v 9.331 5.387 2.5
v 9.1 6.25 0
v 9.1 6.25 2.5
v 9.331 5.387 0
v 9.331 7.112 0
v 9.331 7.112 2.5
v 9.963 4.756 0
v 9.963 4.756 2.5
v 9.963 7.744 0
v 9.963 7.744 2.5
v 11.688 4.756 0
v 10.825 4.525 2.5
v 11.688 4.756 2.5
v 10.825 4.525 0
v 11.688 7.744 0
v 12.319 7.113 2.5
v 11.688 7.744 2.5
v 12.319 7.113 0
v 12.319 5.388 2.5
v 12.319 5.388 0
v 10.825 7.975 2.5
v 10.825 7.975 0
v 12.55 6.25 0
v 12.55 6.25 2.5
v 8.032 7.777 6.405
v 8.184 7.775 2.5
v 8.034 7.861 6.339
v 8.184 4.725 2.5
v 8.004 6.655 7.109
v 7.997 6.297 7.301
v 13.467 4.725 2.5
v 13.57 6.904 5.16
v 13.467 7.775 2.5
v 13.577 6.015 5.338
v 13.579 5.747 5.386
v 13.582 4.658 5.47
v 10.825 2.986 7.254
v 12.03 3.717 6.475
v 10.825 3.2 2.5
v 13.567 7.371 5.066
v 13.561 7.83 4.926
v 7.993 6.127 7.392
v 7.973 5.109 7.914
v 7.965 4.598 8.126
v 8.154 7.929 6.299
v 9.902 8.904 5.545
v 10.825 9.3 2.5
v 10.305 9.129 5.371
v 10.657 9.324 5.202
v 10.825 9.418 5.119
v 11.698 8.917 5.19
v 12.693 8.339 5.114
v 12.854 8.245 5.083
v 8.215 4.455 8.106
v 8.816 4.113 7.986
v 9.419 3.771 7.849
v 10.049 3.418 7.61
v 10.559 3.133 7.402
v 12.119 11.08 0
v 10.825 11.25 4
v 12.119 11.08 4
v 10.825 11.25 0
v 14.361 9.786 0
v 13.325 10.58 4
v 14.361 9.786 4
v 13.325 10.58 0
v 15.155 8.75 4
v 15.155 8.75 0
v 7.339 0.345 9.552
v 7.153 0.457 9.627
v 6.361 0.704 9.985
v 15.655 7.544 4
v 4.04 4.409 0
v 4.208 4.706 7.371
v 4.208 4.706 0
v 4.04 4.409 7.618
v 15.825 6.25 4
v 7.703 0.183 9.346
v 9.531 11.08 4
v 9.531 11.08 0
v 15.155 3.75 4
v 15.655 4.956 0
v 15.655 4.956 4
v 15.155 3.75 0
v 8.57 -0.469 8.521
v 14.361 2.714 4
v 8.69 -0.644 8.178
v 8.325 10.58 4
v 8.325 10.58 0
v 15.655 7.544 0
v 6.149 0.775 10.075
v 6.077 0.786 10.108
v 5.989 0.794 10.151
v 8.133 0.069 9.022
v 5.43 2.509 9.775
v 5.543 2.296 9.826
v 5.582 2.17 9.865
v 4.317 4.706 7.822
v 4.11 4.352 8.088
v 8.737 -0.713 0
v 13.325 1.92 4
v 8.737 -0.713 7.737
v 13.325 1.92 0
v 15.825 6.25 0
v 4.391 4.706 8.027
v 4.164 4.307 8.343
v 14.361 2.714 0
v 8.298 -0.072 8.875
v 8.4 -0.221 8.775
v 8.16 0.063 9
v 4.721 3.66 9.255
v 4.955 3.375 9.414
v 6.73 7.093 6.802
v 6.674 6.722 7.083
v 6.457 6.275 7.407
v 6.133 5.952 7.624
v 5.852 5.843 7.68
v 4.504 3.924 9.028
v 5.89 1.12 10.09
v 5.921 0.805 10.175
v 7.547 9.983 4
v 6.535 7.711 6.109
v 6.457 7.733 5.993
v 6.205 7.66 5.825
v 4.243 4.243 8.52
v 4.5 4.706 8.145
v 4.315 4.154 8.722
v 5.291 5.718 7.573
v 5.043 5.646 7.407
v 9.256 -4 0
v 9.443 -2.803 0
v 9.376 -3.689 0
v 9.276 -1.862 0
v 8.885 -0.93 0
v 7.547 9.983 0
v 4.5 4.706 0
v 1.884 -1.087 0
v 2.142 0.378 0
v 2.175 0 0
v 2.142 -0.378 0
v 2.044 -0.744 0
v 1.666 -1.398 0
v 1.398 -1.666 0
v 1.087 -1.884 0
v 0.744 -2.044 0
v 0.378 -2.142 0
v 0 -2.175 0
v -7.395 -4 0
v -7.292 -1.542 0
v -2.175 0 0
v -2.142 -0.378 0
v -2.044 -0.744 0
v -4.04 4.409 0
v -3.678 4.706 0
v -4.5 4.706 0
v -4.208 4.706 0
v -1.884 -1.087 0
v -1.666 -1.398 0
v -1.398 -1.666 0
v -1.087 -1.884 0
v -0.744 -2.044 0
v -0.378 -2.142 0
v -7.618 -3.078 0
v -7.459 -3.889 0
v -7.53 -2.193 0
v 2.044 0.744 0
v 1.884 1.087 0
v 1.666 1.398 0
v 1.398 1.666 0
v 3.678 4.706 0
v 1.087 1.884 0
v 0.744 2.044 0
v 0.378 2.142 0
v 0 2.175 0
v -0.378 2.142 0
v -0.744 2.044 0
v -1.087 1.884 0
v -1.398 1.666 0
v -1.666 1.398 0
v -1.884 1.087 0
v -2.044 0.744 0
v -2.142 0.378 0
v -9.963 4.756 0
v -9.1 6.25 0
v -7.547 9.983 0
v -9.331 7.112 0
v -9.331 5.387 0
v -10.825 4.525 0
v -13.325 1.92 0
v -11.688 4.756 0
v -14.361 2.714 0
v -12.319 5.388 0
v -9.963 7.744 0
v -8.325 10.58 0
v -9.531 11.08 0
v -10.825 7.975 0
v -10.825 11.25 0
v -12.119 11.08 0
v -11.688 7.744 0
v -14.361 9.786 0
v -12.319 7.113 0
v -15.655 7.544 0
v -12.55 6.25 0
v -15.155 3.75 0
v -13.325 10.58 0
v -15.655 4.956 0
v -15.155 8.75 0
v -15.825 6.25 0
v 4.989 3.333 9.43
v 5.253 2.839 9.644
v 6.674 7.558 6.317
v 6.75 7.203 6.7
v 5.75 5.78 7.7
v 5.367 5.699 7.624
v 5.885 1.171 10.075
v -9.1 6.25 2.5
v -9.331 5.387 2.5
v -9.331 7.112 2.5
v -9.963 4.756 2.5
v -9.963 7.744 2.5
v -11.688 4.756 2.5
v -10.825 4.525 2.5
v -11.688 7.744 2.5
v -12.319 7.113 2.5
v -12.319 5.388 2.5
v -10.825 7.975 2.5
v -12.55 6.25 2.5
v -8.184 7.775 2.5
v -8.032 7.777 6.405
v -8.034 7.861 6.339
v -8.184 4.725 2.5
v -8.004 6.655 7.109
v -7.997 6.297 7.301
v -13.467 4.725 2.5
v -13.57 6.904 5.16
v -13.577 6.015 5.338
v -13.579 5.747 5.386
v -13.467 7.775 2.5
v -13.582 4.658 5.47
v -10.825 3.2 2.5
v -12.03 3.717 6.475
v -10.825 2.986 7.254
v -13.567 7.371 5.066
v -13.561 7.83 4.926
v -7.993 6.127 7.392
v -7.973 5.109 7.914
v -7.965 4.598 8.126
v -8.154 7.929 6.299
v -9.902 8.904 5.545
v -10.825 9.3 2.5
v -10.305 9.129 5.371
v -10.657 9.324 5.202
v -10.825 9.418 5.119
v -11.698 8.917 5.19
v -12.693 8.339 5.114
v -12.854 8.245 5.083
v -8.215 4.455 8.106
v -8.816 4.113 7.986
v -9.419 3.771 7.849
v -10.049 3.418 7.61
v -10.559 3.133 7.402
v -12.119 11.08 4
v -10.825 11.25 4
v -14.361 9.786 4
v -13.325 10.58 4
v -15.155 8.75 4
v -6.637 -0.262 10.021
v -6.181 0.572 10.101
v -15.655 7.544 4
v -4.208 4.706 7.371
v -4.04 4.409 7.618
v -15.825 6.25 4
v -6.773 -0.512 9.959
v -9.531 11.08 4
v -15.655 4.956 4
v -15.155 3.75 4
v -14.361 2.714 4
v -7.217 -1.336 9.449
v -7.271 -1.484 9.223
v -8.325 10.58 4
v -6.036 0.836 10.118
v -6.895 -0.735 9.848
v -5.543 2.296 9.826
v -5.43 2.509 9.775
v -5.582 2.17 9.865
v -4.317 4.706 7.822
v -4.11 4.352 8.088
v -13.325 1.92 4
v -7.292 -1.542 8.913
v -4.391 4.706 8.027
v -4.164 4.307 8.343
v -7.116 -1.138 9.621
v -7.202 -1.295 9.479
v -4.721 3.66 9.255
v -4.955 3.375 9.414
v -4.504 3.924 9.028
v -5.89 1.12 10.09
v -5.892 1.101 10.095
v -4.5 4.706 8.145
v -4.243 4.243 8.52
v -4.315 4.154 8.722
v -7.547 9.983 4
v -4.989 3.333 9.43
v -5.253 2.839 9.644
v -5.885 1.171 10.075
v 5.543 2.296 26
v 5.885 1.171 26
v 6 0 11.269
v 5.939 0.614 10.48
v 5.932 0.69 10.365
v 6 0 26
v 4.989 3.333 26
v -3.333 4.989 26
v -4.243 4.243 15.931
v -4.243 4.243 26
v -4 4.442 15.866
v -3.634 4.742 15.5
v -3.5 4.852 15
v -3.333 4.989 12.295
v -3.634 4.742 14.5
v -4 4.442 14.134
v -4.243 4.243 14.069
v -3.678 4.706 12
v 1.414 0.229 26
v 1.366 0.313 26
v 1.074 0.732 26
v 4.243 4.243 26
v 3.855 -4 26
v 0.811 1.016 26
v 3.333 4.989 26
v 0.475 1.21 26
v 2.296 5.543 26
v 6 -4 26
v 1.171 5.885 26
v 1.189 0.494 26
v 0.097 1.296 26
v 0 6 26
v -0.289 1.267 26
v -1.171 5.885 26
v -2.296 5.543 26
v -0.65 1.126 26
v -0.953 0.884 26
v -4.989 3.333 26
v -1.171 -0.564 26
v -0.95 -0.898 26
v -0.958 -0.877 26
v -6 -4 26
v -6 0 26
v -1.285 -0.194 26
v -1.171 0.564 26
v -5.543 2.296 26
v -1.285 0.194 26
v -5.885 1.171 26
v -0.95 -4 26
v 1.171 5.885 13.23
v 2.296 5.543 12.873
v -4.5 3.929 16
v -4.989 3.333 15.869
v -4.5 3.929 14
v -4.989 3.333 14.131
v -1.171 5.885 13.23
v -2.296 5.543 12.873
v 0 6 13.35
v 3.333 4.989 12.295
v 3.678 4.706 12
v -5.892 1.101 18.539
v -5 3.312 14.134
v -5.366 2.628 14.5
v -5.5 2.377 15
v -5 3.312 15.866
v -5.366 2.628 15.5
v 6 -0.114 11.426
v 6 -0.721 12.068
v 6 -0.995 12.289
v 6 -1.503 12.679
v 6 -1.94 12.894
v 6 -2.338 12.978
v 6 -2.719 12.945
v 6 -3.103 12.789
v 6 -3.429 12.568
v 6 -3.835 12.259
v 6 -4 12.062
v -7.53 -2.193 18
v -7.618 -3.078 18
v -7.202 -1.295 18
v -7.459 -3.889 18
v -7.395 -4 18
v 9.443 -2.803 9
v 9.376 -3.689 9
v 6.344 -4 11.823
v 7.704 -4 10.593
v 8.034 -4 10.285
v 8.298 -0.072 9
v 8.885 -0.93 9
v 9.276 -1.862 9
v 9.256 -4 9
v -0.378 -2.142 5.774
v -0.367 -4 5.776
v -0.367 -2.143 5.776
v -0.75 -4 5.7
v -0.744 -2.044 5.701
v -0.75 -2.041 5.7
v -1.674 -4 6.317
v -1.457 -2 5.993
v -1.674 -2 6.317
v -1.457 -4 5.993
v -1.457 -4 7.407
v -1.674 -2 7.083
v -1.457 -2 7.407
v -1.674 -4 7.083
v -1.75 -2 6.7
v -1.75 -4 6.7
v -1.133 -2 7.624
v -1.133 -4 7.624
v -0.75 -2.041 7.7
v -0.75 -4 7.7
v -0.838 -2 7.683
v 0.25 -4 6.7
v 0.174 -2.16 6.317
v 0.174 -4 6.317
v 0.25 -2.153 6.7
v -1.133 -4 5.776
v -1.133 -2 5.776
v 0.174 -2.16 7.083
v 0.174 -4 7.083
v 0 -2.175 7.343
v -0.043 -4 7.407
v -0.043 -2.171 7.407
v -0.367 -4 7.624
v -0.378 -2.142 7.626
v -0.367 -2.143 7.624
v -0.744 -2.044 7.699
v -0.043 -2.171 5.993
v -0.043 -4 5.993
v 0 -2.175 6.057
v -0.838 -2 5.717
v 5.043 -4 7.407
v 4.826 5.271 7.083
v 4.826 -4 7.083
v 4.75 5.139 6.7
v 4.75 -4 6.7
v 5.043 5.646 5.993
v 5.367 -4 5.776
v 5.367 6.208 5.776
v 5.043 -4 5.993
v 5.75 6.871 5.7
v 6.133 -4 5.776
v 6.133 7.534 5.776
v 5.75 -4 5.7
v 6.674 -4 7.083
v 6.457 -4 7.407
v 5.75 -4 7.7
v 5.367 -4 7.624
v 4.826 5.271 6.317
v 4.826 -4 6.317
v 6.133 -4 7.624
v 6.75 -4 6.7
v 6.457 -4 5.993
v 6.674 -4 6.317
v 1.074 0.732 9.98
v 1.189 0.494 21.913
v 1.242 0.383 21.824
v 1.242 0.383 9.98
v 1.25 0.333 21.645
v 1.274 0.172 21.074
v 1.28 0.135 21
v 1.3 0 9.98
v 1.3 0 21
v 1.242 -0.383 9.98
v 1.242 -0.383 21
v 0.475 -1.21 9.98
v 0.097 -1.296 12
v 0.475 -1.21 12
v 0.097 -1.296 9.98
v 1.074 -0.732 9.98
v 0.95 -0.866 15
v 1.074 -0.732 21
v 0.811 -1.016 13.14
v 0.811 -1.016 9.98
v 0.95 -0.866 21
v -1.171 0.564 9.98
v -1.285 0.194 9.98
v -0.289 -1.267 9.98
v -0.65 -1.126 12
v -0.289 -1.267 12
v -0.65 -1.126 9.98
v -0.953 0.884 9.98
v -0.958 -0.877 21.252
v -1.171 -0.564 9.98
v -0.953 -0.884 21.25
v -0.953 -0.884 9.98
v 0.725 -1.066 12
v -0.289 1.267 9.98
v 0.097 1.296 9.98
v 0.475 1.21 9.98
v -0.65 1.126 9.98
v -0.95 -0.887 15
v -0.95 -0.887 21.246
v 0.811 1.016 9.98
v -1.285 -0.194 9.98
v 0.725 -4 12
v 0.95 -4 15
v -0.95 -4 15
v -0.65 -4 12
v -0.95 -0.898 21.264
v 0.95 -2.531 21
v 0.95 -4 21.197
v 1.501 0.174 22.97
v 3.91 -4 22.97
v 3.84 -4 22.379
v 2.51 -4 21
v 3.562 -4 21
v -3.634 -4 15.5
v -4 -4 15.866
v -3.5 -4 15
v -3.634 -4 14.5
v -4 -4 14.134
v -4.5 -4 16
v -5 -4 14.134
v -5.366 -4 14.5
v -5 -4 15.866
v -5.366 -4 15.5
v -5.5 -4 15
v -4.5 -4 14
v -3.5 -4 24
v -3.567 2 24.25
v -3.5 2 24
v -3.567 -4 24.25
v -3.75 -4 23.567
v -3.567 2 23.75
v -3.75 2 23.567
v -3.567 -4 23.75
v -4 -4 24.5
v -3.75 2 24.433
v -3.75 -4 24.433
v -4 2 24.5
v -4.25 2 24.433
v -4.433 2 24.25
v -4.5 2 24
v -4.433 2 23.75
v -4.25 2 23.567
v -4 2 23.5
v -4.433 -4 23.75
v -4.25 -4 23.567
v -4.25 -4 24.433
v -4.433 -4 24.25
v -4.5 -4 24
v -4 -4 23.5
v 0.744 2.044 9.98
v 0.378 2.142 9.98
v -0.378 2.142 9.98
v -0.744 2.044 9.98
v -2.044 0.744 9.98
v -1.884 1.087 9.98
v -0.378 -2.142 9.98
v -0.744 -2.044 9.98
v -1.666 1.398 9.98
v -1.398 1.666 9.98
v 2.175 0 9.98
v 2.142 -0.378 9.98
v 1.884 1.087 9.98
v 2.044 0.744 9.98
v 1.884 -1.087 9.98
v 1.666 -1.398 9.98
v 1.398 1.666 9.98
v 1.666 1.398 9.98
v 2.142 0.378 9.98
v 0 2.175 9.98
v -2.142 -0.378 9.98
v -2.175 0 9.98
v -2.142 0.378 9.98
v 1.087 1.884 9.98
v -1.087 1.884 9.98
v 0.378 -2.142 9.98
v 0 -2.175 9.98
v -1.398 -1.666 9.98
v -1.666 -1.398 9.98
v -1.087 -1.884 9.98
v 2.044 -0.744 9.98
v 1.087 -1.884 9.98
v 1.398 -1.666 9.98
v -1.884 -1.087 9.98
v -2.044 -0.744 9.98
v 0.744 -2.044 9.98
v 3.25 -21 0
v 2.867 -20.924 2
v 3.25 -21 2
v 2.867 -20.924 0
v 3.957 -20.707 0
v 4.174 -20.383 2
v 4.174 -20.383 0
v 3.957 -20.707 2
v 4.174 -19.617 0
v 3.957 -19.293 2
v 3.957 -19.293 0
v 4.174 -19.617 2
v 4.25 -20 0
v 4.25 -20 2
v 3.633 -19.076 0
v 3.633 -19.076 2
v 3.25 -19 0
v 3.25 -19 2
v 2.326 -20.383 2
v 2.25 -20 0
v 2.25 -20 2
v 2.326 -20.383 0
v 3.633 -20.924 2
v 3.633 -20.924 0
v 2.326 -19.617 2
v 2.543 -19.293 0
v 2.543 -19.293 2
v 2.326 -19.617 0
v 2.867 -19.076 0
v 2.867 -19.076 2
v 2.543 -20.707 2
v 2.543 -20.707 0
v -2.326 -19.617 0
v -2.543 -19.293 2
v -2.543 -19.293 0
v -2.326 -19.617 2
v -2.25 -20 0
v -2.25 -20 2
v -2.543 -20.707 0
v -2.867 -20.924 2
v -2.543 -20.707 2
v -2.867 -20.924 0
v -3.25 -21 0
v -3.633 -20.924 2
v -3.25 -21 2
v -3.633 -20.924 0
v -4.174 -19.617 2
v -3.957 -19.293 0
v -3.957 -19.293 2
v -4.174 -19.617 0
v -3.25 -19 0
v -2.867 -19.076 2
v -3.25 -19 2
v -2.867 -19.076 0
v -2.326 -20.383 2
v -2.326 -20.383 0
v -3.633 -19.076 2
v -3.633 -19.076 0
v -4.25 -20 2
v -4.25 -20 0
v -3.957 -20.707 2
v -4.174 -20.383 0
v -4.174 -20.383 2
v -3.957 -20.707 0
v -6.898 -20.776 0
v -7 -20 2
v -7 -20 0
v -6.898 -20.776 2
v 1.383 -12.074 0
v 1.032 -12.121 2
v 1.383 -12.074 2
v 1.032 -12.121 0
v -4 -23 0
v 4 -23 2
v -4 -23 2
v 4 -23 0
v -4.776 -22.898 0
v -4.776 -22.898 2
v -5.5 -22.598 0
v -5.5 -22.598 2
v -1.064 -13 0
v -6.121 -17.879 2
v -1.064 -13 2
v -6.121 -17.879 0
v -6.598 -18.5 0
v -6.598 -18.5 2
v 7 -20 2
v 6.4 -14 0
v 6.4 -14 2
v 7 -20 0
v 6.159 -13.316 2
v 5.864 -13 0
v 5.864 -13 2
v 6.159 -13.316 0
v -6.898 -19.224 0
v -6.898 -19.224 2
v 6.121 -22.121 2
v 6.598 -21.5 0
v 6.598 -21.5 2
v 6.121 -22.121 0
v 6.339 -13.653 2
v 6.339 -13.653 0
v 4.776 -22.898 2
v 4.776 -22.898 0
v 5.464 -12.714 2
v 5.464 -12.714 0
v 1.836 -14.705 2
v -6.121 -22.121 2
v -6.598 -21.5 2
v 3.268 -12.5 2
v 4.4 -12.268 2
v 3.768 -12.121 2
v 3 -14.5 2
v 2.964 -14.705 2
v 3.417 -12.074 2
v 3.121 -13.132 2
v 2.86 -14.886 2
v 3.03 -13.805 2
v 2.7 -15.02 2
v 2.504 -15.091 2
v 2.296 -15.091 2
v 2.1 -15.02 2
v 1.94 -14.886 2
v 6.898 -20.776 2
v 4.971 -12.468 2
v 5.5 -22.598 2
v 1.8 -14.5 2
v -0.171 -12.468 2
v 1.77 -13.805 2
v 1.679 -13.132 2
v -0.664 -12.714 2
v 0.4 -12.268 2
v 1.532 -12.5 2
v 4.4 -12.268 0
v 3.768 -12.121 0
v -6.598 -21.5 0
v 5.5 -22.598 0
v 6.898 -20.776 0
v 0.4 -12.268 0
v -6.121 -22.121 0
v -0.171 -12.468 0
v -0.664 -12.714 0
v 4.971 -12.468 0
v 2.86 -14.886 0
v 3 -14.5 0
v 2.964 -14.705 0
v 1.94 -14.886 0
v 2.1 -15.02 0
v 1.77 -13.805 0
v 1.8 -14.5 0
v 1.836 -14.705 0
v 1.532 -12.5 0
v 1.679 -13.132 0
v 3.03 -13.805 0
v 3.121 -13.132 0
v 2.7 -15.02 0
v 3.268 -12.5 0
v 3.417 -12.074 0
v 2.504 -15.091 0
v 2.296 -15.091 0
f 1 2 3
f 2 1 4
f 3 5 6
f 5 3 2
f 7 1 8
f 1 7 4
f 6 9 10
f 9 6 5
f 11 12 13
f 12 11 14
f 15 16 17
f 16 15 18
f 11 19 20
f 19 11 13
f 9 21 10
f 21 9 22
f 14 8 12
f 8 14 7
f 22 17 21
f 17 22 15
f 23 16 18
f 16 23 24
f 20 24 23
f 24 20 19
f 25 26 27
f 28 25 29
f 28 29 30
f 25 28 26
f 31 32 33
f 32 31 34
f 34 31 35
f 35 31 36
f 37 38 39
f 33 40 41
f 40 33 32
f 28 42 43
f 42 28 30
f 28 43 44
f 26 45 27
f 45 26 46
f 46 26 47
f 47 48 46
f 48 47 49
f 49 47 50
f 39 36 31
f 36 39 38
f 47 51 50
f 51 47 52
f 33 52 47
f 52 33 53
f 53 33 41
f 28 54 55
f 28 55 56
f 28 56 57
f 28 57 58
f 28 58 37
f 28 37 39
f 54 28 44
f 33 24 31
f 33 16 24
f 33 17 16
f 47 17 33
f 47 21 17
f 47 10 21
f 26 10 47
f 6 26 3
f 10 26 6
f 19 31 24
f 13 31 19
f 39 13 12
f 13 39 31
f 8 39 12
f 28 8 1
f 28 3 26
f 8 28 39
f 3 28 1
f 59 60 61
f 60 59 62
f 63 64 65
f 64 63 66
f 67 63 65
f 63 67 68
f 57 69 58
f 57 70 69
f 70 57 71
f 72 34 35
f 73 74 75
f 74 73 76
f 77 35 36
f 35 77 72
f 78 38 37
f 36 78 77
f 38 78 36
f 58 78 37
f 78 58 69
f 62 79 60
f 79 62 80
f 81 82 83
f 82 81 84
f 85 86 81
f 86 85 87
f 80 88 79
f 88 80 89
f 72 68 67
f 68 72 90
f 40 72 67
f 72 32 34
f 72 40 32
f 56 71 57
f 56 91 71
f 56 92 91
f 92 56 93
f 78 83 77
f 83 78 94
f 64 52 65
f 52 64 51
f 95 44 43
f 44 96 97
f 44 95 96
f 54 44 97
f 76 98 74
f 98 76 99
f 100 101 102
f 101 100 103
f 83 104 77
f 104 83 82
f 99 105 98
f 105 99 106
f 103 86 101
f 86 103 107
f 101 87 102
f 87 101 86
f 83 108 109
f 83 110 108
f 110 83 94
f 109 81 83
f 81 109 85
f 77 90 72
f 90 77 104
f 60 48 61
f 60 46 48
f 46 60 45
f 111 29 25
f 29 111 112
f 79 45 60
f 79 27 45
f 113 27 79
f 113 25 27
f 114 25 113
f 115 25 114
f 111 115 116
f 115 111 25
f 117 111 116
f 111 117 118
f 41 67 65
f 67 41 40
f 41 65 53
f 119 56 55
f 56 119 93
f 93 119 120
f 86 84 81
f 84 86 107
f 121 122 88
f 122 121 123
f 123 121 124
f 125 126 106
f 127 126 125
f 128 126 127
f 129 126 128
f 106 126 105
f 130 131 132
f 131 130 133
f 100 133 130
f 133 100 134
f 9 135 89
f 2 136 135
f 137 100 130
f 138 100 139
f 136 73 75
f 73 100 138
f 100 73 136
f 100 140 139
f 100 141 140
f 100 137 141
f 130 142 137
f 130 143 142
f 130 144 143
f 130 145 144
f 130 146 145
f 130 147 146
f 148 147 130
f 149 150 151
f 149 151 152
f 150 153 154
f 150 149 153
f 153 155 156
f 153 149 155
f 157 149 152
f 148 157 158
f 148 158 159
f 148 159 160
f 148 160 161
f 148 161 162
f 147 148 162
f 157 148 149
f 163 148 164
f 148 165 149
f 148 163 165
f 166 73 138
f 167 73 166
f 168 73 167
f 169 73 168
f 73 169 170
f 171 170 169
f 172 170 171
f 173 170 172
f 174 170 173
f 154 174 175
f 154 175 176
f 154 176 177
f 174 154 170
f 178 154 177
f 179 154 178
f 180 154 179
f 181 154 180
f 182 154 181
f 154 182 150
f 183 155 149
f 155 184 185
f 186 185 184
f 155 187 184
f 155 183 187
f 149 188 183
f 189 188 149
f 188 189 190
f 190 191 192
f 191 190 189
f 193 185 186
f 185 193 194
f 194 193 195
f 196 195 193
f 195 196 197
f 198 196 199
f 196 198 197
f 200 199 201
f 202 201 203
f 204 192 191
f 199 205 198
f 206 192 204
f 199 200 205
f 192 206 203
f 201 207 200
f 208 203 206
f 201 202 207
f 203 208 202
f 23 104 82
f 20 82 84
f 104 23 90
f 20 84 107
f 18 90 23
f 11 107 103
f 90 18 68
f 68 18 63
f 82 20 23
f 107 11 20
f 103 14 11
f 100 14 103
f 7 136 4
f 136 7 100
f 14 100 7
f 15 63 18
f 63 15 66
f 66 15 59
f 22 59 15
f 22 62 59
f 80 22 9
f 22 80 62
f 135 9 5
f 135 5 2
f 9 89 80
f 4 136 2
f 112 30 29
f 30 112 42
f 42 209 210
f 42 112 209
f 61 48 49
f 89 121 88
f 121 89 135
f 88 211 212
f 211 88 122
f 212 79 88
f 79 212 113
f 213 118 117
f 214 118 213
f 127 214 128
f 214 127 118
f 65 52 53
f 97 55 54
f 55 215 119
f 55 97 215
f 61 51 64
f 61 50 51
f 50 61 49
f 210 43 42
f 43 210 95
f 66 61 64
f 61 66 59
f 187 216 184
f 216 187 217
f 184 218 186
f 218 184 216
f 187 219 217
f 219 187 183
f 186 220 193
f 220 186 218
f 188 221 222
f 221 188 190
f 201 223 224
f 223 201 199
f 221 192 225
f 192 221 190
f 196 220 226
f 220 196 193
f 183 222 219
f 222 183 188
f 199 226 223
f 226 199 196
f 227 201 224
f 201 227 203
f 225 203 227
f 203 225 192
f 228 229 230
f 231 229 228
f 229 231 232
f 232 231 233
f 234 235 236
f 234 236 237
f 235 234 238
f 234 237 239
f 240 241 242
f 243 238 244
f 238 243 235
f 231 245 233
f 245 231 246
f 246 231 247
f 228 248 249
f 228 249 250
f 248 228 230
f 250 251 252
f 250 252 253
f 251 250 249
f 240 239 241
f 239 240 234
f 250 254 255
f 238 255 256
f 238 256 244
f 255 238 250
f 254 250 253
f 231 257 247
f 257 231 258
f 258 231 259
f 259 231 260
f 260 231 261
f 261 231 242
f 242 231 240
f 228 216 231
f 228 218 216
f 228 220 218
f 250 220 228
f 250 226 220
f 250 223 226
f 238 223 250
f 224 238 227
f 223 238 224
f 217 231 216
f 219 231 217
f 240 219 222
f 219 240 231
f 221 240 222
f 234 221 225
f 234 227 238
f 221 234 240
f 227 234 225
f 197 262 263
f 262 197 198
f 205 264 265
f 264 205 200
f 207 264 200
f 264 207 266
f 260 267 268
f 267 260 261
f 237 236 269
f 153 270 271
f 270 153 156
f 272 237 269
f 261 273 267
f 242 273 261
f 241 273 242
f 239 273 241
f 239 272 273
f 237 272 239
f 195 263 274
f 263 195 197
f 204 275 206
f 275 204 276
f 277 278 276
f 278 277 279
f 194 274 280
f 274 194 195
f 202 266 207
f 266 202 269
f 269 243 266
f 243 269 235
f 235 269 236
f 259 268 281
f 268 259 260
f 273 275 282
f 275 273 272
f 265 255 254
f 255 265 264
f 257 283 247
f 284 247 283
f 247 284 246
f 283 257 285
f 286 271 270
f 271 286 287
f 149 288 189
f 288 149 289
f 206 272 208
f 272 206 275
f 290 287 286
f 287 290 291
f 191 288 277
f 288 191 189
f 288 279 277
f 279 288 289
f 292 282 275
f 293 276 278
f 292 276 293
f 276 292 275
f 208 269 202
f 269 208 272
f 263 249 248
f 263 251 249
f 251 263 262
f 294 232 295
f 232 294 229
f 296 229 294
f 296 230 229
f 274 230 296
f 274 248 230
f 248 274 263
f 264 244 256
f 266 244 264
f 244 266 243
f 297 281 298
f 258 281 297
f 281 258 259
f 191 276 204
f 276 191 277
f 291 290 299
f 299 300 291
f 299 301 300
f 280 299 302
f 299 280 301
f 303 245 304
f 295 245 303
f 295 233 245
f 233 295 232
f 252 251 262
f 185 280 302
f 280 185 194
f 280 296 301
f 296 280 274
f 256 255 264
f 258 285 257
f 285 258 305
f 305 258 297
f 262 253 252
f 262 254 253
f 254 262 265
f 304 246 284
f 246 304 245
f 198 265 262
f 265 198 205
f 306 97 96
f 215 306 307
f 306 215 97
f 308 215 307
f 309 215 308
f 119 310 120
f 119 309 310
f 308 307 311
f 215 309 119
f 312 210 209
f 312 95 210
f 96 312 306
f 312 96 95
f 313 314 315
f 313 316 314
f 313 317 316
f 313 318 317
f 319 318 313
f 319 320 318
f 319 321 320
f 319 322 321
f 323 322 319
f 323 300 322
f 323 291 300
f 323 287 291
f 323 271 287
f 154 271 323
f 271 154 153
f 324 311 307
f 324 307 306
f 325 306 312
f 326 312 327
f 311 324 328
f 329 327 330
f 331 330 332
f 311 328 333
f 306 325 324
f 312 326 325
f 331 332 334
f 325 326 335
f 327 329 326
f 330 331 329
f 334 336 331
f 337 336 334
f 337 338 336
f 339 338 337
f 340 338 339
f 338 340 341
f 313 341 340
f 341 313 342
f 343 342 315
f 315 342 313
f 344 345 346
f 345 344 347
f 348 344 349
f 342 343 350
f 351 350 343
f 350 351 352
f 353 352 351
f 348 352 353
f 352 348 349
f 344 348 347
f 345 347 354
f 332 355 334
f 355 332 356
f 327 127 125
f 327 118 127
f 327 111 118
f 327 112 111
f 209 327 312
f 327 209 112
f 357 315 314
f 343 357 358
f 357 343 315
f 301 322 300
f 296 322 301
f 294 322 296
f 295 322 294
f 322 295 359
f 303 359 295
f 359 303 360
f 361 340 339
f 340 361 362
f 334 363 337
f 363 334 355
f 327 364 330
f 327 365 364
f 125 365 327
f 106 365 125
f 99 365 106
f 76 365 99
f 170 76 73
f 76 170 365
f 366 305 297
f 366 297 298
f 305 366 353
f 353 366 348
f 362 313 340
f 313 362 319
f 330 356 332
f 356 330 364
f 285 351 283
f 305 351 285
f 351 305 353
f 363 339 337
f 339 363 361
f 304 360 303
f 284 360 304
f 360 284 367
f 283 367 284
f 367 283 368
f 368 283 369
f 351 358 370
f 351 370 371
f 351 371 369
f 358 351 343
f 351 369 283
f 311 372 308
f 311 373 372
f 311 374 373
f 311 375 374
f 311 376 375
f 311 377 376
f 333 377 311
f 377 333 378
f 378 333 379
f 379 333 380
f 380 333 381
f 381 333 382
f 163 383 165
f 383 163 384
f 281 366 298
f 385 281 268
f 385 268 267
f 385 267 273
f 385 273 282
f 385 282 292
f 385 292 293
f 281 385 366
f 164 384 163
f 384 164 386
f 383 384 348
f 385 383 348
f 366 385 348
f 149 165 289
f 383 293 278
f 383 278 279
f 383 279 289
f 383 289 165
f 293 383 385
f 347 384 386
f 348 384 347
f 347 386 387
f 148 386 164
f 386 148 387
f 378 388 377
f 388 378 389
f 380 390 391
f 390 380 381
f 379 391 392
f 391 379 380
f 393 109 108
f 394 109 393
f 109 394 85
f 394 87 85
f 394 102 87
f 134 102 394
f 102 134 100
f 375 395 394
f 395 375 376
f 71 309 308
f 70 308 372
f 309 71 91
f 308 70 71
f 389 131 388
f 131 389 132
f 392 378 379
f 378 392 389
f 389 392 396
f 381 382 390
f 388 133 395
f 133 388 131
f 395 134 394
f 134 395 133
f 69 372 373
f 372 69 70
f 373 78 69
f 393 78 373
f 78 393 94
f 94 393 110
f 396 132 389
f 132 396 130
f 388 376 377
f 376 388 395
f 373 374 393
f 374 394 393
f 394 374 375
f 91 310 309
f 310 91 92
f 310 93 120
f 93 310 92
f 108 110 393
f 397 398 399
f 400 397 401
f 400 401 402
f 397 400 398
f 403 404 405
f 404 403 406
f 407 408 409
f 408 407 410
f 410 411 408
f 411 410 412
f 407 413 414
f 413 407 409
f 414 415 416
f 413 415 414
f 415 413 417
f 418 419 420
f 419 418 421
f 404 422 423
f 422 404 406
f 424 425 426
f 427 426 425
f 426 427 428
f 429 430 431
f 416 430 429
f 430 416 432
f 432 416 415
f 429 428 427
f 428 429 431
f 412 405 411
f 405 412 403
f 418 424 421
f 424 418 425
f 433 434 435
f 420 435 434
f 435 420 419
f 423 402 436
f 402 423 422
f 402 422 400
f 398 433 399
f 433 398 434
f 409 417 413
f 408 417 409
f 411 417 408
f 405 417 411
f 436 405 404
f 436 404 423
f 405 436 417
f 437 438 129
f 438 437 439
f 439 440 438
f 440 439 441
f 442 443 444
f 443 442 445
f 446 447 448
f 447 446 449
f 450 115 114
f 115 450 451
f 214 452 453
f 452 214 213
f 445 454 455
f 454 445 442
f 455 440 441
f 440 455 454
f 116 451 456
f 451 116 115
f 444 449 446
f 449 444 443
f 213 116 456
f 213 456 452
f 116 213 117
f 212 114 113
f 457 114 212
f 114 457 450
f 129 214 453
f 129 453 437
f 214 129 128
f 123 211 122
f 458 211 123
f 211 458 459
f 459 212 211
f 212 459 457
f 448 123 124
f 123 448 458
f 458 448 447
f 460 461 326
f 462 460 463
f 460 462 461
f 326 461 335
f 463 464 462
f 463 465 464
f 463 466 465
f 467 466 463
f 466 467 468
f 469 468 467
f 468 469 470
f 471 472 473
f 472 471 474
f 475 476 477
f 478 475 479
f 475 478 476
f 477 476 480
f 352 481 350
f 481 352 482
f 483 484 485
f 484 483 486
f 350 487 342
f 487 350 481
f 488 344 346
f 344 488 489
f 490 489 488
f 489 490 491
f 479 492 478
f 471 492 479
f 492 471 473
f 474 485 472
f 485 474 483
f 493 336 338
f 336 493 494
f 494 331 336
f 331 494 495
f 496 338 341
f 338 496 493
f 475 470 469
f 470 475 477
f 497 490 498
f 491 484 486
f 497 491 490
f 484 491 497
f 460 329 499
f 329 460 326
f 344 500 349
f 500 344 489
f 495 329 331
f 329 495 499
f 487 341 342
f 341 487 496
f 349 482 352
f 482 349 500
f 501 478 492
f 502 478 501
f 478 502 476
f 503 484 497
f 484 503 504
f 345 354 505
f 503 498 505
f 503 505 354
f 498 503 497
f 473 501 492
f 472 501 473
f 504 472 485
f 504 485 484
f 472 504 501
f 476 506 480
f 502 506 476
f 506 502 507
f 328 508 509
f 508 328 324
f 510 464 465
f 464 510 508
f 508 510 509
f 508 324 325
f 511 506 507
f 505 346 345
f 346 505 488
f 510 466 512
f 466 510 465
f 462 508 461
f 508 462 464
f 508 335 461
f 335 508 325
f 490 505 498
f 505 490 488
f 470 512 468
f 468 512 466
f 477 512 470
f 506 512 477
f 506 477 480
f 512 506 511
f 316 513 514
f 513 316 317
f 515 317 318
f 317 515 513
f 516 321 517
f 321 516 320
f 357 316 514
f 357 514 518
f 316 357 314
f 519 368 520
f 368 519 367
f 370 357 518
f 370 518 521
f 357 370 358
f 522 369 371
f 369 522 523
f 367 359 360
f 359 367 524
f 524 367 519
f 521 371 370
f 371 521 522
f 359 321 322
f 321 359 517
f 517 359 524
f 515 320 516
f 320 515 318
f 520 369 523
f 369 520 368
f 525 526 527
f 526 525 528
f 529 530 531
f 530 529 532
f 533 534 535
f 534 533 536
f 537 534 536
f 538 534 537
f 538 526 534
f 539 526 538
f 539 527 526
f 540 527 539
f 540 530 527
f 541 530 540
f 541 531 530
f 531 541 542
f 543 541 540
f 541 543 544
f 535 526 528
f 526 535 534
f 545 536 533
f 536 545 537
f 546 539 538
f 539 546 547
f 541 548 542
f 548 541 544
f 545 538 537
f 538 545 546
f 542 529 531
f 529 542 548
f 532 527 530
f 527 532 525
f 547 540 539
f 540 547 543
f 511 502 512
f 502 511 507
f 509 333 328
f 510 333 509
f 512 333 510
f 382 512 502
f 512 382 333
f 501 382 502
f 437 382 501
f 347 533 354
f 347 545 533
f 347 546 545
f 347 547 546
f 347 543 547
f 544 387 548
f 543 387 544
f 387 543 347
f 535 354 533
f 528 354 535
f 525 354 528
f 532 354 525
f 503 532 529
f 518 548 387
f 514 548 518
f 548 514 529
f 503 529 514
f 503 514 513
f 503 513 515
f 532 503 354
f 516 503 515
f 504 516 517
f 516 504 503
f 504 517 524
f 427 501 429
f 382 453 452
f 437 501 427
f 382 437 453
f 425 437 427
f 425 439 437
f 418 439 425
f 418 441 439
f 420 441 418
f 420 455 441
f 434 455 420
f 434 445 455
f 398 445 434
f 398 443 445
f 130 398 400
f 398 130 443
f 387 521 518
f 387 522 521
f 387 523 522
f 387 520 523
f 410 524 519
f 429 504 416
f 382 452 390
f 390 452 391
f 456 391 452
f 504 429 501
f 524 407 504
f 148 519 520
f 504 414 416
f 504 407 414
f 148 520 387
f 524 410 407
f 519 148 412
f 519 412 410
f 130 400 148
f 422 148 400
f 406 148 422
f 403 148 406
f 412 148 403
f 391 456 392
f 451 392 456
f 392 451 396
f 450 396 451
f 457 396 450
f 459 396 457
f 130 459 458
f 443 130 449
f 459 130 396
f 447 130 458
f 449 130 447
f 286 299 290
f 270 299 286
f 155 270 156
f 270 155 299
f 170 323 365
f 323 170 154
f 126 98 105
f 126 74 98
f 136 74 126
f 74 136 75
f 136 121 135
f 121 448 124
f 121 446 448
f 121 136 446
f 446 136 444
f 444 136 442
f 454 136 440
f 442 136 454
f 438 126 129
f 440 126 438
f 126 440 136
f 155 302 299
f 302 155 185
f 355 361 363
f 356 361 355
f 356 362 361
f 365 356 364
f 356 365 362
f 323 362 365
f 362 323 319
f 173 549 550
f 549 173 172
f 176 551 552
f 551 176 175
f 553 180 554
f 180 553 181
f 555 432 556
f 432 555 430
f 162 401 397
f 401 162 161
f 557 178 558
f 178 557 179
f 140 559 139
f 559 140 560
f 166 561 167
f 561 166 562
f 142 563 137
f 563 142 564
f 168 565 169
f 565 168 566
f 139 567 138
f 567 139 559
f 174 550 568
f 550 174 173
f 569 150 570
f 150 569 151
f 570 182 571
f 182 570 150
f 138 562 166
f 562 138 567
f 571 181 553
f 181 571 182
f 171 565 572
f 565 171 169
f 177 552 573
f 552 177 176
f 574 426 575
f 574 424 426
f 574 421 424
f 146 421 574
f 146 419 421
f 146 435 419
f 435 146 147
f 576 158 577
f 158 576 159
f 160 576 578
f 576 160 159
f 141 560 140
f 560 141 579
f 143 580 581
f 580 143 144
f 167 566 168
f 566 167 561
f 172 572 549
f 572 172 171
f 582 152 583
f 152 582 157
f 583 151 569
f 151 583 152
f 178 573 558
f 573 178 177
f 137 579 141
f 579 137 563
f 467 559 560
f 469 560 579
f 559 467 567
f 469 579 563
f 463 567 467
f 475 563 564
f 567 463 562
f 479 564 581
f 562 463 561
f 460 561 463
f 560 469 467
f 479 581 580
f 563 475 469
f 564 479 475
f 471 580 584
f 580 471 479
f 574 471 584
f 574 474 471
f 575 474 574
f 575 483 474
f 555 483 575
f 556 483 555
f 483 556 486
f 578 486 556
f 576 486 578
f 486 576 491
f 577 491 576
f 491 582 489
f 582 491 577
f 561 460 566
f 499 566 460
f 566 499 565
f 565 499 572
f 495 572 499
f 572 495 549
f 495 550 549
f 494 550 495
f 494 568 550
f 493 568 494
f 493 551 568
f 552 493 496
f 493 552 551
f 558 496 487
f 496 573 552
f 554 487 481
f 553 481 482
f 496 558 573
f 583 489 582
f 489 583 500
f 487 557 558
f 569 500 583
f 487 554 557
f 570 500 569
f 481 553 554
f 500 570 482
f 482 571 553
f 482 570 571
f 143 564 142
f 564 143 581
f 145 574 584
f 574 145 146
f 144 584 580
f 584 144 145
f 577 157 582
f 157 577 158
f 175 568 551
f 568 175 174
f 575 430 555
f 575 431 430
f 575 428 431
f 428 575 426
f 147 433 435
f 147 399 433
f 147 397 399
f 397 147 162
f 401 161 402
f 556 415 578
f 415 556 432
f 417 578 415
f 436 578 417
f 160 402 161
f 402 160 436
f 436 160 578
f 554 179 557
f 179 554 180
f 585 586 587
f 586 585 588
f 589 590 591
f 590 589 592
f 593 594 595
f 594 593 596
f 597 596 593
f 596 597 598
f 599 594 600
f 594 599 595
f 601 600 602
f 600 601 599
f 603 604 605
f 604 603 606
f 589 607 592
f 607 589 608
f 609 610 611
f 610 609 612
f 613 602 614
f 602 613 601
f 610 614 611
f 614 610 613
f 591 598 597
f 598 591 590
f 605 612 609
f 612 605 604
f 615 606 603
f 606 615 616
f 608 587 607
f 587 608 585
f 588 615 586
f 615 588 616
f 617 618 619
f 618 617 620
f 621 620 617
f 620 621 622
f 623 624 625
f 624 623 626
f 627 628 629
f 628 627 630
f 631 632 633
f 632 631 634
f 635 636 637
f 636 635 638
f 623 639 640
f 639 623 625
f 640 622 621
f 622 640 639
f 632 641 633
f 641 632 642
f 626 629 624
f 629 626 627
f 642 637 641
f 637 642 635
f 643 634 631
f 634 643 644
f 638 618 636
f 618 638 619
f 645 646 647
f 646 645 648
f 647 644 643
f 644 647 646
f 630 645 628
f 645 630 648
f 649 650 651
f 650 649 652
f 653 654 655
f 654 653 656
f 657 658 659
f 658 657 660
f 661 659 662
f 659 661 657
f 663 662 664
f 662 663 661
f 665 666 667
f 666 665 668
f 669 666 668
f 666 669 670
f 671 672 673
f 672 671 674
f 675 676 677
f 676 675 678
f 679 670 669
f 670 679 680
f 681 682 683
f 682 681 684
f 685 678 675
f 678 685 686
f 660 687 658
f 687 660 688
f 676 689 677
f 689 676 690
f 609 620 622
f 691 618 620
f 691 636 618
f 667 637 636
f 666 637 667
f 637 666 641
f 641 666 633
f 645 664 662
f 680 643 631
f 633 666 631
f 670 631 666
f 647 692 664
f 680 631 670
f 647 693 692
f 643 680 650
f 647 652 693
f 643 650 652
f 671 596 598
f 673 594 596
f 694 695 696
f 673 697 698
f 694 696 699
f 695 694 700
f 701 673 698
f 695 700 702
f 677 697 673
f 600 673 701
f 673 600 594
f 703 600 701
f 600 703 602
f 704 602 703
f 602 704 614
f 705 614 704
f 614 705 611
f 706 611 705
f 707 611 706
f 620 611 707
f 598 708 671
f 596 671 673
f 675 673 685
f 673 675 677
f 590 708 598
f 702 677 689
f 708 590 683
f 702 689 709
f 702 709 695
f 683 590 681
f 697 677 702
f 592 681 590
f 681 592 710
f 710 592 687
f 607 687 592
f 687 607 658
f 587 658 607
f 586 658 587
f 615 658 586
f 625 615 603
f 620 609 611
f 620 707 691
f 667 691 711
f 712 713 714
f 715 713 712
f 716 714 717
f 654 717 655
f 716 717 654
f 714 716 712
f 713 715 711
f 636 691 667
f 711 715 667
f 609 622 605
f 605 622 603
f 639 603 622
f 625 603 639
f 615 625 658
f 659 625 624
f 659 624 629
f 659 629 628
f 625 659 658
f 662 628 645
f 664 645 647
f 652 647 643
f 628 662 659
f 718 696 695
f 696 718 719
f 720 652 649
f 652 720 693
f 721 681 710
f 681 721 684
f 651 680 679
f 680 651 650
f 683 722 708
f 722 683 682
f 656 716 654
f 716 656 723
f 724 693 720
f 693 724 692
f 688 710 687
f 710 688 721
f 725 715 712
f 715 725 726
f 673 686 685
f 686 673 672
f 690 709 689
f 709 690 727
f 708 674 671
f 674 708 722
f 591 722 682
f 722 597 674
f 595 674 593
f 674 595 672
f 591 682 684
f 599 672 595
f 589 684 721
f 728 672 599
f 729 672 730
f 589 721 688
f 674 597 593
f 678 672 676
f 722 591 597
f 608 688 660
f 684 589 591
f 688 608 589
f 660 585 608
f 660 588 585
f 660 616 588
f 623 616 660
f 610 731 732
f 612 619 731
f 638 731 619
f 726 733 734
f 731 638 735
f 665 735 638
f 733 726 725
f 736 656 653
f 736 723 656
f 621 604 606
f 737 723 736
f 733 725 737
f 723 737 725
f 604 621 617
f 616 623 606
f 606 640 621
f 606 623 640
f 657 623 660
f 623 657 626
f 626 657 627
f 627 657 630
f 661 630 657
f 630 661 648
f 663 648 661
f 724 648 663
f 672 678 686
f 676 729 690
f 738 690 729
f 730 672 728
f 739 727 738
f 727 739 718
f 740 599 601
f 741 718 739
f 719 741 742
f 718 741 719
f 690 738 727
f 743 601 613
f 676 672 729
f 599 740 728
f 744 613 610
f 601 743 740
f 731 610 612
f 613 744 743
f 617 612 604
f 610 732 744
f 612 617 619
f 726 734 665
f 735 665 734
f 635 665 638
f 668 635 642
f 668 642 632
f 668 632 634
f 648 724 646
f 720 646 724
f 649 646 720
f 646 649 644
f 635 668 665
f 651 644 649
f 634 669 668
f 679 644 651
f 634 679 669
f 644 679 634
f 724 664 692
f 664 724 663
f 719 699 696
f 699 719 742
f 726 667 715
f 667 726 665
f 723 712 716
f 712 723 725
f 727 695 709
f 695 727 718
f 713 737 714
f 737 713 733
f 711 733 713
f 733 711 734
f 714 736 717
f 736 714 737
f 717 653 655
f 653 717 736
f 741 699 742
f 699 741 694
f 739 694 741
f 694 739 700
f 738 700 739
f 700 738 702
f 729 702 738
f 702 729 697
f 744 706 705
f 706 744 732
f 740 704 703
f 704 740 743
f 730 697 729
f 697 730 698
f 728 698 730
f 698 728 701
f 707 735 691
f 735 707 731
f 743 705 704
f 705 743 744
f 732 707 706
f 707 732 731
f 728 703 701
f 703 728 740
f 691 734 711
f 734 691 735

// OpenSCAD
// file: configuration.scad
// Increase this if your slicer or printer make holes too tight.
extra_radius = 0.1;

// OD = outside diameter, corner to corner.
m3_nut_od = 6.1;
m3_nut_radius = m3_nut_od/2 + 0.2 + extra_radius;
m3_washer_radius = 3.5 + extra_radius;

// Major diameter of metric 3mm thread.
m3_major = 2.85;
m3_radius = m3_major/2 + extra_radius;
m3_wide_radius = m3_major/2 + extra_radius + 0.2;

// NEMA17 stepper motors.
motor_shaft_diameter = 5;
motor_shaft_radius = motor_shaft_diameter/2 + extra_radius;

// Frame brackets. M3x8mm screws work best with 3.6 mm brackets.
thickness = 3.6;

// OpenBeam or Misumi. Currently only 15x15 mm, but there is a plan
// to make models more parametric and allow 20x20 mm in the future.
extrusion = 15;

// Placement for the NEMA17 stepper motors.
motor_offset = 44;
motor_length = 47;
// main file
include <configuration.scad>;

height = 26;
height2 = 26;
tunnel = 2.4;
face_offset = 4;

module nanoswitchHoles() {
   translate([ 6.5/2,0,-15+13]) cylinder(h=22,r=1,$fn=16);
   translate([-6.5/2,0,-15]) cylinder(h=22,r=1,$fn=16);
}

module nanoswitch() {
  difference() {
      translate([-12.8/2,-1,0]) cube([12.8,6.2,5.75]);
      translate([0,0,-1]) nanoswitchHoles();
    }
  #translate([12.8/2-4,6.2-1,1]) cylinder(h=5.75-2,r=0.45,$fn=16);
}

// little slot to help glide probe handle on top of switch
module guideSlot() {
  difference() {
    union() {
      translate([-2.6,0,0]) scale([1,2,1]) cylinder(h=4,r=2,$fn=36);
      translate([ 2.6,0,0]) scale([1,2,1]) cylinder(h=4,r=2,$fn=36);
      hull() {
        translate([-11,-10,0]) cube([18,1,4]);
        translate([-9,-1,0]) cube([15,1,4]);
      }
      translate([-4.5,0,2]) cube([6,4,4],center=true);
    }
  cylinder(h=5,r=.6,$fn=18);
  }
}

module nanoswitchGuide() {
  //%translate([-12.8/2,-1,0]) cube([12.8,6.2,5.75]);
  //%translate([12.8/2-4,6.2-1,1]) cylinder(h=5.75-2,r=0.45,$fn=16);
  intersection() {
    difference() {
      hull() {
        translate([-4,0,0]) cylinder(r=3,h=2,$fn=24);
        translate([ 4,0,0]) cylinder(r=3,h=2,$fn=24);
        translate([ 2.4,6,0]) scale([2,1,1]) cylinder(r=2,h=2,$fn=36);
      }
      translate([0,0,-1]) nanoswitchHoles();
    }
    translate([2.4,5.5,-1]) guideSlot();
  }
}

module hotEndHullProxy() {
  hull() {
    translate([0,0,1]) cylinder(r=3,h=17,$fn=24);
    cylinder(r=9,h=13,$fn=6);
  }
}

module foot() {
  difference() {
    rotate([0,0,-60]) hull() {
      translate([12.5,0,0]) cylinder(r=5, h=4, $fn=24);
      translate([1,-3,0]) scale([1,2,1]) cylinder(r=1,h=12,$fn=9);
    }
    translate([12.5, 0, 0]) {
      for (a = [60:120:359]) {
            rotate([0, 0, a]) translate([-12.5, 0, 0]) {
          cylinder(r=m3_wide_radius, h=20, center=true, $fn=12);
          translate([0,0,2.5]) cylinder(r1=3.05, r2=3.5, h=10, $fn=6);
      }}
    }
  }
}

// main hole centered at (0,0).
module retractable() {
  difference() {
    union() {
      cylinder(r=6, h=height, $fn=32);
      translate([-6,-6,0]) cube([12,  6,   height]);
      hull() {
        translate([-6,-4,0]) cube([2,4,height]);
        translate([-2,2,15]) cylinder(r=3,h=4,$fn=16);
        translate([-8+4,-2,0]) rotate([0,0,-50]) scale([1.5,2,1]) cylinder(r=2,h=18,$fn=24);
      }
      // extra wide for switch sticking out
      hull() {
        translate([6,-2,0]) rotate([0,0,-50]) scale([4,3,1]) cylinder(r=1,h=9,$fn=24);
        translate([3,-2,15]) sphere(1);
      }

      // Feet for vertical M3 screw attachment.
      rotate([0, 0, 90]) {
        foot();
        scale([1, -1, 1]) foot();
      }

    }

    // central drill hole
    cylinder(r=tunnel/2+extra_radius, h=3*height, center=true, $fn=21);

    // main probe handle slot
    translate([-(tunnel-0.5)/2, -7, 12]) hull() {
      translate([0,0,3])  cube([tunnel-0.5  ,7,15]);
      translate([.3,0,0]) cube([tunnel-1.025,7,1]);
    }

    // retracted probe catch ledge
    hull() {
      translate([tunnel/2, 0, 21]) rotate([0, 0,-150]) {
        translate([0,2,1]) cube([tunnel,8,9]);
        rotate([0,-10,0])  cube([tunnel,7,2]);
      }
      translate([0,0,21])cylinder(r=tunnel/2,h=15,$fn=18);
    }

    // Safety needle spring.
    translate([-4.5, 0, height-11]) rotate([90, 0, 0])
      translate([0,0,-8]) cylinder(r=1, h=20, $fn=12);
    translate([-4, 0, height-2]) rotate([90, 0, 0])
      translate([0,0,-2]) cylinder(r=1/2, h=20, $fn=12);
    
    // Flat front face.
    translate([0, -face_offset-10, height/2]) cube([30, 20, 2*height], center=true);

    // make sure we clear the hot-end hull on top
    translate([0,12.5,-1]) hotEndHullProxy();

    // Sub-miniature micro switch.
    translate([-2.5, -face_offset, 5]) {
      mirror([1,0,0]) translate([-5,0,1.7]) rotate([90,0,0]) { 
        %nanoswitch();
        nanoswitchHoles();
      }
    }

    // bore out a larger hole to hold bowden tube for lower-friction probe guide
    translate([0,0,-.02]) cylinder(h=12-2,r=3.95/2+.2,$fn=36);

  }
}

// put solid layer below holes for quelab printer
//union(){
//  translate([0,0,0.15])
    retractable();
//  color("Cyan") {
//    hull() {
//      translate([-11,-4.5,0]) cube([7,10,.3]);
//      translate([-11,6.5,0]) cylinder(h=.3,r=5.5,$fn=16);
//    }
//    hull() {
//      translate([4,-4.5,0]) cube([2,10,.3]);
//      translate([ 11,6.5,0]) cylinder(h=.3,r=5.5,$fn=16);
//    }
//    translate([-4.5,-4.5,0]) cube([9,10,.3]);
//  }
//}

// show in relation to effector head :
//use <effectorC.scad>;
//%translate([0,12.5,-4]) scale([1.02,1.02,1]) effector();

// draw a probe handle guide plate, to be converted to DXF for laser cut
translate([0,-20,0]) {
  %translate([0,0,-5.75]) nanoswitch();
  nanoswitchGuide();
}
